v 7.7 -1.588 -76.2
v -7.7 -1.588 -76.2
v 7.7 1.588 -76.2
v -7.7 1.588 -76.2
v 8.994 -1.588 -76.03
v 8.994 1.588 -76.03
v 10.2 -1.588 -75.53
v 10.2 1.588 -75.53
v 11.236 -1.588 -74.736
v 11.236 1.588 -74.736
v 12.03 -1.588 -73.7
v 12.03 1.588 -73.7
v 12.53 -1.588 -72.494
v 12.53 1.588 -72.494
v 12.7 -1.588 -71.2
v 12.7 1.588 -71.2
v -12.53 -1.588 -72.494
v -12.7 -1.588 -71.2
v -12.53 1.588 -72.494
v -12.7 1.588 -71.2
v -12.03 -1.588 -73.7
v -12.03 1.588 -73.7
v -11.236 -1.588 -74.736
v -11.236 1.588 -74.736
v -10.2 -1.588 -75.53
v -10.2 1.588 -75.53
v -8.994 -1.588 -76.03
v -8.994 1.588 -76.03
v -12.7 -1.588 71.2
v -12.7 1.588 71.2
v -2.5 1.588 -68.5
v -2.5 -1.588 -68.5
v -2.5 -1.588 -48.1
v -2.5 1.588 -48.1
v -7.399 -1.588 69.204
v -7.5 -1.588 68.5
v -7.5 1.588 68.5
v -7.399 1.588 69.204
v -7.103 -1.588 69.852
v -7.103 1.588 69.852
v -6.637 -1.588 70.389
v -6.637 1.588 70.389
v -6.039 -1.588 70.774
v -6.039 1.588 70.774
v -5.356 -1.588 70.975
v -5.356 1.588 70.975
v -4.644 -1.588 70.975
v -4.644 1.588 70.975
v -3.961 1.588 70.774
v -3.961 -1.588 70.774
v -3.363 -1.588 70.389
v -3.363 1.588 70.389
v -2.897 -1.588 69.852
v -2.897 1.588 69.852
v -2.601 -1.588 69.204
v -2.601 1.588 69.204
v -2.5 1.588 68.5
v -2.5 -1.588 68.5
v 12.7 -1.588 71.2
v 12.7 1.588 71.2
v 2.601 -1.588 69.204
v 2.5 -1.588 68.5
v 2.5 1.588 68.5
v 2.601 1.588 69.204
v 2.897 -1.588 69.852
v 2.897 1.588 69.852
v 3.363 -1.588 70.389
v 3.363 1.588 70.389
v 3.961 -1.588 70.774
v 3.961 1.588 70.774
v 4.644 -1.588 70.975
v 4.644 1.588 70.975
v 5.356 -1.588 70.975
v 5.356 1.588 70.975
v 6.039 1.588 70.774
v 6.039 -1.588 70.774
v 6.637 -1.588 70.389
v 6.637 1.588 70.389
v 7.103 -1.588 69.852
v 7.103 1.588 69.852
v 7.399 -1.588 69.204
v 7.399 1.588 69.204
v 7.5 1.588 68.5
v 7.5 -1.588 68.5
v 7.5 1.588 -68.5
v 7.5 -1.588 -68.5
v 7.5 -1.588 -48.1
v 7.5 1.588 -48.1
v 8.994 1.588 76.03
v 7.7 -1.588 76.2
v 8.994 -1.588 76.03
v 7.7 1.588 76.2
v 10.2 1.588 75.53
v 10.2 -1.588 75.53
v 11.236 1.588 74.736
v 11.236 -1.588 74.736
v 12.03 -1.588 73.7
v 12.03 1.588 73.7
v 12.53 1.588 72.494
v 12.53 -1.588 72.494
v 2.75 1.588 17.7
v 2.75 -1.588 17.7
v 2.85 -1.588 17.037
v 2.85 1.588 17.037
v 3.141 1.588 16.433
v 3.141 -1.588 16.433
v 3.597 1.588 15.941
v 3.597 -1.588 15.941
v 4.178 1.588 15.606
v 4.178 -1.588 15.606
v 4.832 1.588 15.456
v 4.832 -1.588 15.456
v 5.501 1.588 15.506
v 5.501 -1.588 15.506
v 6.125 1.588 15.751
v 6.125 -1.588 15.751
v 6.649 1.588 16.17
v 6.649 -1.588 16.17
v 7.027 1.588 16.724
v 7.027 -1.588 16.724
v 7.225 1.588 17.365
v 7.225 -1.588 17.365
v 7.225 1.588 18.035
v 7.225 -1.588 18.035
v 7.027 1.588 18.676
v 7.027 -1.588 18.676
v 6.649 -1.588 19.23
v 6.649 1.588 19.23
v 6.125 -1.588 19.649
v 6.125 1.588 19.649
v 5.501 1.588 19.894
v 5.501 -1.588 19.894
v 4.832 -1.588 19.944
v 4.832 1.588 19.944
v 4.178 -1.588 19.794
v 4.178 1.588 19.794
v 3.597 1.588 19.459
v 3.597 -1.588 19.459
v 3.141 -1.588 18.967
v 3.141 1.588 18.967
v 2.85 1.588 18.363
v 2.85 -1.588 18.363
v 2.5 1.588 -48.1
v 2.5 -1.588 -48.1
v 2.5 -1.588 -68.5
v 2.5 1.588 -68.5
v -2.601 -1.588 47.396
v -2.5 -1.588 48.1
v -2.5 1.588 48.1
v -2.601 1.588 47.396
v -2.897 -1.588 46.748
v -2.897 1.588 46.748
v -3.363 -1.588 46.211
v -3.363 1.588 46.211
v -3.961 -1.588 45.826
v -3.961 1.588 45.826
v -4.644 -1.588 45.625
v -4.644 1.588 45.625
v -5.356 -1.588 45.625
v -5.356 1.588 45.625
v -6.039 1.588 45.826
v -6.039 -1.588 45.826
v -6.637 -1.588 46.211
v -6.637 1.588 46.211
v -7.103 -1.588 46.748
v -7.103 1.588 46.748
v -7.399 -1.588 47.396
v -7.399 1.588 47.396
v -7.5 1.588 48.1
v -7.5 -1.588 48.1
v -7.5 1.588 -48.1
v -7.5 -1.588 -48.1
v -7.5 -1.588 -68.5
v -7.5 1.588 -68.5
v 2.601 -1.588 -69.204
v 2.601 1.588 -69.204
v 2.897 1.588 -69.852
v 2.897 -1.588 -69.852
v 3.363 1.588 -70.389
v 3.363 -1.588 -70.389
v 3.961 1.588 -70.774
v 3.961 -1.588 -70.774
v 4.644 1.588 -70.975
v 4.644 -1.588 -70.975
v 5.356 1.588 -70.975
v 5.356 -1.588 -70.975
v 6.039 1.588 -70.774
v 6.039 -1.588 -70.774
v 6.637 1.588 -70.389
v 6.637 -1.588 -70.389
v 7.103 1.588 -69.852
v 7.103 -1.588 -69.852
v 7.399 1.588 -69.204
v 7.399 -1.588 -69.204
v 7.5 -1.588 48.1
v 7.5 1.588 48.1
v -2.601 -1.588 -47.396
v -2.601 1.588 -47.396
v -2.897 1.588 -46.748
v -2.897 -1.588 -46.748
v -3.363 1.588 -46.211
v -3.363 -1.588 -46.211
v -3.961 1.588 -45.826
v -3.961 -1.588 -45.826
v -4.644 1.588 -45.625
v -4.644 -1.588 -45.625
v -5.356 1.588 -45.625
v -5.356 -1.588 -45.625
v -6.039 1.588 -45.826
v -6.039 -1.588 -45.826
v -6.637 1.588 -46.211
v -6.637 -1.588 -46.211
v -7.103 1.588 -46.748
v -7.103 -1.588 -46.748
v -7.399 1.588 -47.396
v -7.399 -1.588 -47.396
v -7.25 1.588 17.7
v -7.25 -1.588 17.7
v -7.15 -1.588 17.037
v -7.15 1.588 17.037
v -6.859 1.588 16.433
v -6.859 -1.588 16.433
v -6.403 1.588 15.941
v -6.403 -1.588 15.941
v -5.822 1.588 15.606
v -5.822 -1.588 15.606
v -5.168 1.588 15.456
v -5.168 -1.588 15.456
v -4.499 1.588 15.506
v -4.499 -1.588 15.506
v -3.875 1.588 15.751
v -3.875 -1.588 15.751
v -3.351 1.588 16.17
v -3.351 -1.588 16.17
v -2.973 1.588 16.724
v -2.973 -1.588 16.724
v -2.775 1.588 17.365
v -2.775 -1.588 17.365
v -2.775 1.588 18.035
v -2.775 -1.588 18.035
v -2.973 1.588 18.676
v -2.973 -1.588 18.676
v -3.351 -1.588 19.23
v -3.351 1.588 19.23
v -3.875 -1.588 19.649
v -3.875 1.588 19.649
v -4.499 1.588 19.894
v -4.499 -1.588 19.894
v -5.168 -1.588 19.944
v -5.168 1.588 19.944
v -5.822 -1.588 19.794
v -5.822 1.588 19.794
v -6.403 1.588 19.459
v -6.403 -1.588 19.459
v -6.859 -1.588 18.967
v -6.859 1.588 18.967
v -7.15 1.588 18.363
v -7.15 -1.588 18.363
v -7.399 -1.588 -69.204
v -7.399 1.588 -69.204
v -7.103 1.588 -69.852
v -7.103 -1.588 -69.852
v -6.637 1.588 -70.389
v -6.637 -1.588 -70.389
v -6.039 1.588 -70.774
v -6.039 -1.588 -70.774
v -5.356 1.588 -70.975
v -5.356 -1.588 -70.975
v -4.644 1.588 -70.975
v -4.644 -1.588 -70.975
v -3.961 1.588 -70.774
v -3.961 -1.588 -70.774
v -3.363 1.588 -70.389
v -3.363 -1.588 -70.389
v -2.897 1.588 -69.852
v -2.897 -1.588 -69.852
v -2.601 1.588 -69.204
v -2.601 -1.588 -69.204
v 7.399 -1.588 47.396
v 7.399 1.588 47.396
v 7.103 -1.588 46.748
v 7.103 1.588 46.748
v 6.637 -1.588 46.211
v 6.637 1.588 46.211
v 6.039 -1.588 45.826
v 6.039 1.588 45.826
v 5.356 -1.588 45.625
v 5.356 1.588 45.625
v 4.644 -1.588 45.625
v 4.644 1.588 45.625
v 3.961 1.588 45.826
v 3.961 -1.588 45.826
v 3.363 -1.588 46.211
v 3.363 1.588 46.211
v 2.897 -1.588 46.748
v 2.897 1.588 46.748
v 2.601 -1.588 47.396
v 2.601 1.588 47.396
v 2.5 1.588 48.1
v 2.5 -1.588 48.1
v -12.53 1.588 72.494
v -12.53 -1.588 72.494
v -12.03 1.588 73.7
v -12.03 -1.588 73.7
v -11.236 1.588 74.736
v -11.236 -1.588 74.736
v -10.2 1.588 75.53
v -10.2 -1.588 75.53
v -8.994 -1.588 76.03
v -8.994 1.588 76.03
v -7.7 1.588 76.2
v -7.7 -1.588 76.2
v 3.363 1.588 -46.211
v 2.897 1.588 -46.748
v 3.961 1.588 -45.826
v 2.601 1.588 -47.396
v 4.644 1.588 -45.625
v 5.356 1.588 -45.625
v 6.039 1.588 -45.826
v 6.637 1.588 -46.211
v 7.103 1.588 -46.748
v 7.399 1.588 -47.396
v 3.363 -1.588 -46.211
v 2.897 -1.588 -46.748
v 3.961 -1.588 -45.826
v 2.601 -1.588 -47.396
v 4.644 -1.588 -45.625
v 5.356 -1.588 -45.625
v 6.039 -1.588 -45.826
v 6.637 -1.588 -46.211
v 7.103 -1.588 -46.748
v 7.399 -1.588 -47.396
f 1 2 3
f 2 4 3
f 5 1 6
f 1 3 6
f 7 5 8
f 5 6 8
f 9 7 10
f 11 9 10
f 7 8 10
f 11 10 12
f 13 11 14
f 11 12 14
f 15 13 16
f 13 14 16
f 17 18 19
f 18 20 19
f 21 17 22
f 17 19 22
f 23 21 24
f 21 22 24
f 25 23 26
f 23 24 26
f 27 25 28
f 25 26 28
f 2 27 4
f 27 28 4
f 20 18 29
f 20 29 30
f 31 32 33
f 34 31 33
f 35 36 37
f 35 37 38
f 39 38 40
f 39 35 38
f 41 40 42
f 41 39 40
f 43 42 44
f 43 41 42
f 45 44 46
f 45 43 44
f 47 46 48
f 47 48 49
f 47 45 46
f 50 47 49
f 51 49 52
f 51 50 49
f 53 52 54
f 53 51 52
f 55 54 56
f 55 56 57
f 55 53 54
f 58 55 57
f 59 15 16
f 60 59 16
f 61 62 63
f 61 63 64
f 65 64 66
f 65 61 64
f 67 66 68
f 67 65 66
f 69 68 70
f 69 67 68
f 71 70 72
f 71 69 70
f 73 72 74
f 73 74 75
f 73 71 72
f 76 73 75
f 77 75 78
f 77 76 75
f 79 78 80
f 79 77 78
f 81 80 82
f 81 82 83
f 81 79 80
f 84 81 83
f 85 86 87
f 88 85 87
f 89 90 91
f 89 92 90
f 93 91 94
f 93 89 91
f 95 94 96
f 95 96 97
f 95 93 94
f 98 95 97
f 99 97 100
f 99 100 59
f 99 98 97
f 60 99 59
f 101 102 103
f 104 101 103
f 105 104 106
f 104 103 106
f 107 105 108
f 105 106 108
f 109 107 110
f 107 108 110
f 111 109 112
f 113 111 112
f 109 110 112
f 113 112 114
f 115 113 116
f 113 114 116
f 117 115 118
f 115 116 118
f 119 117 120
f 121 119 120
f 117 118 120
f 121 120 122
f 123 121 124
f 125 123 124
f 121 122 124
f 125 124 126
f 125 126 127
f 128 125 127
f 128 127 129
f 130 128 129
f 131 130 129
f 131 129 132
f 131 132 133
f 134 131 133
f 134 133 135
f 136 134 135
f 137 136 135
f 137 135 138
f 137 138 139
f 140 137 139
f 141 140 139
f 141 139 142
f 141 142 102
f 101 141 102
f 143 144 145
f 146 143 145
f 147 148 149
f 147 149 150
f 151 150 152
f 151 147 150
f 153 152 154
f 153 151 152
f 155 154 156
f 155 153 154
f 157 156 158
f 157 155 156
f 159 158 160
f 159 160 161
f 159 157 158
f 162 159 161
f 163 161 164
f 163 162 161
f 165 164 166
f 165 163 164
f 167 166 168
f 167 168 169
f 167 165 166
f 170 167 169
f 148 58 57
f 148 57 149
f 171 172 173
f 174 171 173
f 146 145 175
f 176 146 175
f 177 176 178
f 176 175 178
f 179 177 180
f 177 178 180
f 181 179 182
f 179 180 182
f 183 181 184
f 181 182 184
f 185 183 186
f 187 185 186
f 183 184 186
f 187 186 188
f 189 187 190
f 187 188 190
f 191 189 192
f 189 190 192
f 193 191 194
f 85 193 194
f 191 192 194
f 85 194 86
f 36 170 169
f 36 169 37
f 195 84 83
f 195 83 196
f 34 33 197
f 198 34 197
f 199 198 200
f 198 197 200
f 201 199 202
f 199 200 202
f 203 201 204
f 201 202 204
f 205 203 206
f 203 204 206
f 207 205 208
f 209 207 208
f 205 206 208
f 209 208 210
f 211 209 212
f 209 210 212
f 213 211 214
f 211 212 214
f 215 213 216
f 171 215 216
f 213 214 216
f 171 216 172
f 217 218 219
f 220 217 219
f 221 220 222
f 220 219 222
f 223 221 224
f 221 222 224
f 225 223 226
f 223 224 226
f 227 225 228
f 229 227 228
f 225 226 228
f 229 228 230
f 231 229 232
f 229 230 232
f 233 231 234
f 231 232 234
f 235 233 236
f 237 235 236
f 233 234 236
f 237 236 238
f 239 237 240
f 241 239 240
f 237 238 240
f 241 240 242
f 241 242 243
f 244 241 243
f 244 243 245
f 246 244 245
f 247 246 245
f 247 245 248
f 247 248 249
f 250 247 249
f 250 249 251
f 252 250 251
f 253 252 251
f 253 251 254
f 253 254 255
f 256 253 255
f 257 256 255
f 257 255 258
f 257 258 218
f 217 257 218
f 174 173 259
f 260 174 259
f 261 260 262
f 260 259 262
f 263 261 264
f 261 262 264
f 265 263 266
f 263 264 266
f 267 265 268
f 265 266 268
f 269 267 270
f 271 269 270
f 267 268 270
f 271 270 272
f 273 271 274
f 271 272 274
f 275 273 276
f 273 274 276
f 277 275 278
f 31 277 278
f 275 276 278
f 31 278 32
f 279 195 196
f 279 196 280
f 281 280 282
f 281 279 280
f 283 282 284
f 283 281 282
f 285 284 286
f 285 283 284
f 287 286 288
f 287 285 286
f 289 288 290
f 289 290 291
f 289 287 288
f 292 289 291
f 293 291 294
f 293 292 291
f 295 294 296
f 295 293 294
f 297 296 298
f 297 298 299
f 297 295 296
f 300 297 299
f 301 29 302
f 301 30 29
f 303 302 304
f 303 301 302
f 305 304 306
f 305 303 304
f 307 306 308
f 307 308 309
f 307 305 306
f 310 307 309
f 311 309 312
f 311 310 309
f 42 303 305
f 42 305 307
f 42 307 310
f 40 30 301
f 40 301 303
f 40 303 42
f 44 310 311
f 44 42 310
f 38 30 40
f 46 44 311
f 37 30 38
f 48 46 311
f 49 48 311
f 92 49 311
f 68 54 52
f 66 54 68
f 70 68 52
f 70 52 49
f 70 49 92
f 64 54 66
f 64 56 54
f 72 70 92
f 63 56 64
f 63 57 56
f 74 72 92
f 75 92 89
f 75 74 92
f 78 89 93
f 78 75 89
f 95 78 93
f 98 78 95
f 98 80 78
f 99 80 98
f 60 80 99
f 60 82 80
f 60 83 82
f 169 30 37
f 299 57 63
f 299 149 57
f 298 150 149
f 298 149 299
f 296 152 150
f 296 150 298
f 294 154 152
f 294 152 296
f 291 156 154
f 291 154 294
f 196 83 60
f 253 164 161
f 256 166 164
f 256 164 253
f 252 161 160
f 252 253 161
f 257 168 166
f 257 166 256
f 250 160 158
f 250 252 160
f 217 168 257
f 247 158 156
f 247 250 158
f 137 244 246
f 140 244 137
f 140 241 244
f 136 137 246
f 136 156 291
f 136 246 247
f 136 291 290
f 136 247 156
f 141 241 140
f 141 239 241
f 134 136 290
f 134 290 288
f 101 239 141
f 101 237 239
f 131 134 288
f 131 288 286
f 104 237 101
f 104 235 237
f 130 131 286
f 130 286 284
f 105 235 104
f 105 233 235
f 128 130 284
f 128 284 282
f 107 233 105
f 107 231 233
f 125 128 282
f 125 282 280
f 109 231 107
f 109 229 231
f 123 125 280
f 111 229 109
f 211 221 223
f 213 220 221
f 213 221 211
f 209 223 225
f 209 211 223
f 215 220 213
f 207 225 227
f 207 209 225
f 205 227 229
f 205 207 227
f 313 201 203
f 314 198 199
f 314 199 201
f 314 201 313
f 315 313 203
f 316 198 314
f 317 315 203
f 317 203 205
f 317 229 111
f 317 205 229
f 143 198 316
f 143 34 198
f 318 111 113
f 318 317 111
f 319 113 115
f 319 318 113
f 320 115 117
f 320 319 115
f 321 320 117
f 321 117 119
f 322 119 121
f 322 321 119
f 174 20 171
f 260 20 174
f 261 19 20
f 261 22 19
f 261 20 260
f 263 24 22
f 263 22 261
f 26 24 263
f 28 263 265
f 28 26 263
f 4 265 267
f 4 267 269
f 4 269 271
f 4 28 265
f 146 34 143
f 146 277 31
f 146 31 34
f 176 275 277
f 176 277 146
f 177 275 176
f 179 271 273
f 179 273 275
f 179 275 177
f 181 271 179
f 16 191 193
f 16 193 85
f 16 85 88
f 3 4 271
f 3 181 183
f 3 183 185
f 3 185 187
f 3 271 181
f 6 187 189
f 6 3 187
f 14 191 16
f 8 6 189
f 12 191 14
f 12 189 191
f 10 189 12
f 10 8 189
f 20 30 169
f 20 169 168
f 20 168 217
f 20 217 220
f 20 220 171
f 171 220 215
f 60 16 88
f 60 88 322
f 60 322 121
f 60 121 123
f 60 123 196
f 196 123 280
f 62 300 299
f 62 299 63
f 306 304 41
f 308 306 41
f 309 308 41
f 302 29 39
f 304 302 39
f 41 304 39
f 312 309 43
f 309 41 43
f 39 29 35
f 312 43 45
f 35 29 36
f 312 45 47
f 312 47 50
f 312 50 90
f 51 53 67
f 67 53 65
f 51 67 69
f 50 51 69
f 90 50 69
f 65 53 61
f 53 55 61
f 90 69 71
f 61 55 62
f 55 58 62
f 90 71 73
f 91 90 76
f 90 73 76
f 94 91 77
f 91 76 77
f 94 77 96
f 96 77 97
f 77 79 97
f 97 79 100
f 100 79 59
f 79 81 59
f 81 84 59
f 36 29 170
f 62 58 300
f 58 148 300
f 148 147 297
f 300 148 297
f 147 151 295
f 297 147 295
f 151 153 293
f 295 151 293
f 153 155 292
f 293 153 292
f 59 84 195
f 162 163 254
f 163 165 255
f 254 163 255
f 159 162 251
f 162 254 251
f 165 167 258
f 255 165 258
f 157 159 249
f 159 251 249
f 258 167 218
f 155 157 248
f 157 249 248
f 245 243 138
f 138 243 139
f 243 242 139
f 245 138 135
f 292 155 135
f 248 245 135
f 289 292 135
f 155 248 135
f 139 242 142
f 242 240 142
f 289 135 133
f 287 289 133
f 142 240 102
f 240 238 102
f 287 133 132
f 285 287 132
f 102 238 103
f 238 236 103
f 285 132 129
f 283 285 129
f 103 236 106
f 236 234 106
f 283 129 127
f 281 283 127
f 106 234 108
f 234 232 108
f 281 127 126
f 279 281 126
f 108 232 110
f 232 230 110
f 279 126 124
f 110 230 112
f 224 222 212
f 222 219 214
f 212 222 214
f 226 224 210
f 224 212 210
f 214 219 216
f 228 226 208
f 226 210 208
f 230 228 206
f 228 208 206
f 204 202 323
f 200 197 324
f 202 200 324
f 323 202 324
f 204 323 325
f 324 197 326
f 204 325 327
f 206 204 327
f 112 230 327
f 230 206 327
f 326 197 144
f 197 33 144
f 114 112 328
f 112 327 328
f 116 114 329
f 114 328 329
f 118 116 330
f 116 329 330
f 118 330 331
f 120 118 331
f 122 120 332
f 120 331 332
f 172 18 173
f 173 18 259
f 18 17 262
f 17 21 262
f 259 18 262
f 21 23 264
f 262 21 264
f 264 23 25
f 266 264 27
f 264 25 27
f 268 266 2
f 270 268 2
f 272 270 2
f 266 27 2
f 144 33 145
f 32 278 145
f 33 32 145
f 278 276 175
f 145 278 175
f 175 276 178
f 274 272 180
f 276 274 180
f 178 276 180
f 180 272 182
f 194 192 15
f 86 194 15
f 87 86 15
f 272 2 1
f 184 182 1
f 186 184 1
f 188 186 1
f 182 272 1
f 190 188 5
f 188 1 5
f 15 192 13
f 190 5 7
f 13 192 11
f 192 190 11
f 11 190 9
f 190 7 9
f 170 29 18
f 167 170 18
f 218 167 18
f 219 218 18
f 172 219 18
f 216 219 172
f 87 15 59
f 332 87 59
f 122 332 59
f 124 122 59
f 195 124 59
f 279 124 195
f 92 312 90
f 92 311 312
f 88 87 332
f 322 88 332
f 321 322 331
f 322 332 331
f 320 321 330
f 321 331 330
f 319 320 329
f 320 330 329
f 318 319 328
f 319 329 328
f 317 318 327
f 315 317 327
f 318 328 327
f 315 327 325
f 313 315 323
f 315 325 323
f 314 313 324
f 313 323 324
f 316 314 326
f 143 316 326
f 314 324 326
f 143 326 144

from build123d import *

# Parameters (mm, degrees)
BOSS_EXTRUDE1_DEPTH      = 76.2
BOSS_EXTRUDE1_DEPTH_BACK = 76.2
SKETCH3_W                = 25.4
SKETCH3_H                = 3.175
CUT_EXTRUDE2_DEPTH       = 3.175
FILLET1_R                = 5
M4_CLEARANCE_HOLE1_D     = 4.5


with BuildPart() as part:
    # Sketch3 → Boss-Extrude1 (new, two sides: drawn at the far end of the back side and taken through both)
    with BuildSketch(Plane.XY.offset(-BOSS_EXTRUDE1_DEPTH_BACK)):
        Rectangle(SKETCH3_W, SKETCH3_H)
    extrude(amount=BOSS_EXTRUDE1_DEPTH + BOSS_EXTRUDE1_DEPTH_BACK)

    # Sketch5 → Cut-Extrude2 (cut)
    with BuildSketch(Plane(origin=(0, -1.5875, 0), x_dir=(-1, 0, 0), z_dir=(0, -1, 0))):
        with BuildLine():
            Line((7.5, -48.1), (7.5, -68.5))
            ThreePointArc((7.5, -68.5), (5, -71), (2.5, -68.5))
            Line((2.5, -68.5), (2.5, -48.1))
            ThreePointArc((2.5, -48.1), (5, -45.6), (7.5, -48.1))
        make_face()
        with BuildLine():
            Line((-2.5, -48.1), (-2.5, -68.5))
            ThreePointArc((-2.5, -68.5), (-5, -71), (-7.5, -68.5))
            Line((-7.5, -68.5), (-7.5, -48.1))
            ThreePointArc((-7.5, -48.1), (-5, -45.6), (-2.5, -48.1))
        make_face()
    cut_extrude2 = extrude(amount=-CUT_EXTRUDE2_DEPTH, mode=Mode.SUBTRACT)

    # Mirror1: Cut-Extrude2 across plane
    add(cut_extrude2.mirror(Plane.XY), mode=Mode.SUBTRACT)

    # Fillet1
    fillet1_edges = [part.edges().sort_by_distance(p)[0] for p in [
        (12.7, 0, 76.2),
        (-12.7, 0, -76.2),
        (12.7, 0, -76.2),
        (-12.7, 0, 76.2),
    ]]
    fillet(fillet1_edges, radius=FILLET1_R)

    # M4 Clearance Hole1 (through all)
    with Locations(Plane(origin=(0, 1.5875, 0), x_dir=(1, 0, 0), z_dir=(0, 1, 0))):
        with Locations((5, -17.7), (-5, -17.7)):
            Hole(M4_CLEARANCE_HOLE1_D / 2)


solid = part.part
